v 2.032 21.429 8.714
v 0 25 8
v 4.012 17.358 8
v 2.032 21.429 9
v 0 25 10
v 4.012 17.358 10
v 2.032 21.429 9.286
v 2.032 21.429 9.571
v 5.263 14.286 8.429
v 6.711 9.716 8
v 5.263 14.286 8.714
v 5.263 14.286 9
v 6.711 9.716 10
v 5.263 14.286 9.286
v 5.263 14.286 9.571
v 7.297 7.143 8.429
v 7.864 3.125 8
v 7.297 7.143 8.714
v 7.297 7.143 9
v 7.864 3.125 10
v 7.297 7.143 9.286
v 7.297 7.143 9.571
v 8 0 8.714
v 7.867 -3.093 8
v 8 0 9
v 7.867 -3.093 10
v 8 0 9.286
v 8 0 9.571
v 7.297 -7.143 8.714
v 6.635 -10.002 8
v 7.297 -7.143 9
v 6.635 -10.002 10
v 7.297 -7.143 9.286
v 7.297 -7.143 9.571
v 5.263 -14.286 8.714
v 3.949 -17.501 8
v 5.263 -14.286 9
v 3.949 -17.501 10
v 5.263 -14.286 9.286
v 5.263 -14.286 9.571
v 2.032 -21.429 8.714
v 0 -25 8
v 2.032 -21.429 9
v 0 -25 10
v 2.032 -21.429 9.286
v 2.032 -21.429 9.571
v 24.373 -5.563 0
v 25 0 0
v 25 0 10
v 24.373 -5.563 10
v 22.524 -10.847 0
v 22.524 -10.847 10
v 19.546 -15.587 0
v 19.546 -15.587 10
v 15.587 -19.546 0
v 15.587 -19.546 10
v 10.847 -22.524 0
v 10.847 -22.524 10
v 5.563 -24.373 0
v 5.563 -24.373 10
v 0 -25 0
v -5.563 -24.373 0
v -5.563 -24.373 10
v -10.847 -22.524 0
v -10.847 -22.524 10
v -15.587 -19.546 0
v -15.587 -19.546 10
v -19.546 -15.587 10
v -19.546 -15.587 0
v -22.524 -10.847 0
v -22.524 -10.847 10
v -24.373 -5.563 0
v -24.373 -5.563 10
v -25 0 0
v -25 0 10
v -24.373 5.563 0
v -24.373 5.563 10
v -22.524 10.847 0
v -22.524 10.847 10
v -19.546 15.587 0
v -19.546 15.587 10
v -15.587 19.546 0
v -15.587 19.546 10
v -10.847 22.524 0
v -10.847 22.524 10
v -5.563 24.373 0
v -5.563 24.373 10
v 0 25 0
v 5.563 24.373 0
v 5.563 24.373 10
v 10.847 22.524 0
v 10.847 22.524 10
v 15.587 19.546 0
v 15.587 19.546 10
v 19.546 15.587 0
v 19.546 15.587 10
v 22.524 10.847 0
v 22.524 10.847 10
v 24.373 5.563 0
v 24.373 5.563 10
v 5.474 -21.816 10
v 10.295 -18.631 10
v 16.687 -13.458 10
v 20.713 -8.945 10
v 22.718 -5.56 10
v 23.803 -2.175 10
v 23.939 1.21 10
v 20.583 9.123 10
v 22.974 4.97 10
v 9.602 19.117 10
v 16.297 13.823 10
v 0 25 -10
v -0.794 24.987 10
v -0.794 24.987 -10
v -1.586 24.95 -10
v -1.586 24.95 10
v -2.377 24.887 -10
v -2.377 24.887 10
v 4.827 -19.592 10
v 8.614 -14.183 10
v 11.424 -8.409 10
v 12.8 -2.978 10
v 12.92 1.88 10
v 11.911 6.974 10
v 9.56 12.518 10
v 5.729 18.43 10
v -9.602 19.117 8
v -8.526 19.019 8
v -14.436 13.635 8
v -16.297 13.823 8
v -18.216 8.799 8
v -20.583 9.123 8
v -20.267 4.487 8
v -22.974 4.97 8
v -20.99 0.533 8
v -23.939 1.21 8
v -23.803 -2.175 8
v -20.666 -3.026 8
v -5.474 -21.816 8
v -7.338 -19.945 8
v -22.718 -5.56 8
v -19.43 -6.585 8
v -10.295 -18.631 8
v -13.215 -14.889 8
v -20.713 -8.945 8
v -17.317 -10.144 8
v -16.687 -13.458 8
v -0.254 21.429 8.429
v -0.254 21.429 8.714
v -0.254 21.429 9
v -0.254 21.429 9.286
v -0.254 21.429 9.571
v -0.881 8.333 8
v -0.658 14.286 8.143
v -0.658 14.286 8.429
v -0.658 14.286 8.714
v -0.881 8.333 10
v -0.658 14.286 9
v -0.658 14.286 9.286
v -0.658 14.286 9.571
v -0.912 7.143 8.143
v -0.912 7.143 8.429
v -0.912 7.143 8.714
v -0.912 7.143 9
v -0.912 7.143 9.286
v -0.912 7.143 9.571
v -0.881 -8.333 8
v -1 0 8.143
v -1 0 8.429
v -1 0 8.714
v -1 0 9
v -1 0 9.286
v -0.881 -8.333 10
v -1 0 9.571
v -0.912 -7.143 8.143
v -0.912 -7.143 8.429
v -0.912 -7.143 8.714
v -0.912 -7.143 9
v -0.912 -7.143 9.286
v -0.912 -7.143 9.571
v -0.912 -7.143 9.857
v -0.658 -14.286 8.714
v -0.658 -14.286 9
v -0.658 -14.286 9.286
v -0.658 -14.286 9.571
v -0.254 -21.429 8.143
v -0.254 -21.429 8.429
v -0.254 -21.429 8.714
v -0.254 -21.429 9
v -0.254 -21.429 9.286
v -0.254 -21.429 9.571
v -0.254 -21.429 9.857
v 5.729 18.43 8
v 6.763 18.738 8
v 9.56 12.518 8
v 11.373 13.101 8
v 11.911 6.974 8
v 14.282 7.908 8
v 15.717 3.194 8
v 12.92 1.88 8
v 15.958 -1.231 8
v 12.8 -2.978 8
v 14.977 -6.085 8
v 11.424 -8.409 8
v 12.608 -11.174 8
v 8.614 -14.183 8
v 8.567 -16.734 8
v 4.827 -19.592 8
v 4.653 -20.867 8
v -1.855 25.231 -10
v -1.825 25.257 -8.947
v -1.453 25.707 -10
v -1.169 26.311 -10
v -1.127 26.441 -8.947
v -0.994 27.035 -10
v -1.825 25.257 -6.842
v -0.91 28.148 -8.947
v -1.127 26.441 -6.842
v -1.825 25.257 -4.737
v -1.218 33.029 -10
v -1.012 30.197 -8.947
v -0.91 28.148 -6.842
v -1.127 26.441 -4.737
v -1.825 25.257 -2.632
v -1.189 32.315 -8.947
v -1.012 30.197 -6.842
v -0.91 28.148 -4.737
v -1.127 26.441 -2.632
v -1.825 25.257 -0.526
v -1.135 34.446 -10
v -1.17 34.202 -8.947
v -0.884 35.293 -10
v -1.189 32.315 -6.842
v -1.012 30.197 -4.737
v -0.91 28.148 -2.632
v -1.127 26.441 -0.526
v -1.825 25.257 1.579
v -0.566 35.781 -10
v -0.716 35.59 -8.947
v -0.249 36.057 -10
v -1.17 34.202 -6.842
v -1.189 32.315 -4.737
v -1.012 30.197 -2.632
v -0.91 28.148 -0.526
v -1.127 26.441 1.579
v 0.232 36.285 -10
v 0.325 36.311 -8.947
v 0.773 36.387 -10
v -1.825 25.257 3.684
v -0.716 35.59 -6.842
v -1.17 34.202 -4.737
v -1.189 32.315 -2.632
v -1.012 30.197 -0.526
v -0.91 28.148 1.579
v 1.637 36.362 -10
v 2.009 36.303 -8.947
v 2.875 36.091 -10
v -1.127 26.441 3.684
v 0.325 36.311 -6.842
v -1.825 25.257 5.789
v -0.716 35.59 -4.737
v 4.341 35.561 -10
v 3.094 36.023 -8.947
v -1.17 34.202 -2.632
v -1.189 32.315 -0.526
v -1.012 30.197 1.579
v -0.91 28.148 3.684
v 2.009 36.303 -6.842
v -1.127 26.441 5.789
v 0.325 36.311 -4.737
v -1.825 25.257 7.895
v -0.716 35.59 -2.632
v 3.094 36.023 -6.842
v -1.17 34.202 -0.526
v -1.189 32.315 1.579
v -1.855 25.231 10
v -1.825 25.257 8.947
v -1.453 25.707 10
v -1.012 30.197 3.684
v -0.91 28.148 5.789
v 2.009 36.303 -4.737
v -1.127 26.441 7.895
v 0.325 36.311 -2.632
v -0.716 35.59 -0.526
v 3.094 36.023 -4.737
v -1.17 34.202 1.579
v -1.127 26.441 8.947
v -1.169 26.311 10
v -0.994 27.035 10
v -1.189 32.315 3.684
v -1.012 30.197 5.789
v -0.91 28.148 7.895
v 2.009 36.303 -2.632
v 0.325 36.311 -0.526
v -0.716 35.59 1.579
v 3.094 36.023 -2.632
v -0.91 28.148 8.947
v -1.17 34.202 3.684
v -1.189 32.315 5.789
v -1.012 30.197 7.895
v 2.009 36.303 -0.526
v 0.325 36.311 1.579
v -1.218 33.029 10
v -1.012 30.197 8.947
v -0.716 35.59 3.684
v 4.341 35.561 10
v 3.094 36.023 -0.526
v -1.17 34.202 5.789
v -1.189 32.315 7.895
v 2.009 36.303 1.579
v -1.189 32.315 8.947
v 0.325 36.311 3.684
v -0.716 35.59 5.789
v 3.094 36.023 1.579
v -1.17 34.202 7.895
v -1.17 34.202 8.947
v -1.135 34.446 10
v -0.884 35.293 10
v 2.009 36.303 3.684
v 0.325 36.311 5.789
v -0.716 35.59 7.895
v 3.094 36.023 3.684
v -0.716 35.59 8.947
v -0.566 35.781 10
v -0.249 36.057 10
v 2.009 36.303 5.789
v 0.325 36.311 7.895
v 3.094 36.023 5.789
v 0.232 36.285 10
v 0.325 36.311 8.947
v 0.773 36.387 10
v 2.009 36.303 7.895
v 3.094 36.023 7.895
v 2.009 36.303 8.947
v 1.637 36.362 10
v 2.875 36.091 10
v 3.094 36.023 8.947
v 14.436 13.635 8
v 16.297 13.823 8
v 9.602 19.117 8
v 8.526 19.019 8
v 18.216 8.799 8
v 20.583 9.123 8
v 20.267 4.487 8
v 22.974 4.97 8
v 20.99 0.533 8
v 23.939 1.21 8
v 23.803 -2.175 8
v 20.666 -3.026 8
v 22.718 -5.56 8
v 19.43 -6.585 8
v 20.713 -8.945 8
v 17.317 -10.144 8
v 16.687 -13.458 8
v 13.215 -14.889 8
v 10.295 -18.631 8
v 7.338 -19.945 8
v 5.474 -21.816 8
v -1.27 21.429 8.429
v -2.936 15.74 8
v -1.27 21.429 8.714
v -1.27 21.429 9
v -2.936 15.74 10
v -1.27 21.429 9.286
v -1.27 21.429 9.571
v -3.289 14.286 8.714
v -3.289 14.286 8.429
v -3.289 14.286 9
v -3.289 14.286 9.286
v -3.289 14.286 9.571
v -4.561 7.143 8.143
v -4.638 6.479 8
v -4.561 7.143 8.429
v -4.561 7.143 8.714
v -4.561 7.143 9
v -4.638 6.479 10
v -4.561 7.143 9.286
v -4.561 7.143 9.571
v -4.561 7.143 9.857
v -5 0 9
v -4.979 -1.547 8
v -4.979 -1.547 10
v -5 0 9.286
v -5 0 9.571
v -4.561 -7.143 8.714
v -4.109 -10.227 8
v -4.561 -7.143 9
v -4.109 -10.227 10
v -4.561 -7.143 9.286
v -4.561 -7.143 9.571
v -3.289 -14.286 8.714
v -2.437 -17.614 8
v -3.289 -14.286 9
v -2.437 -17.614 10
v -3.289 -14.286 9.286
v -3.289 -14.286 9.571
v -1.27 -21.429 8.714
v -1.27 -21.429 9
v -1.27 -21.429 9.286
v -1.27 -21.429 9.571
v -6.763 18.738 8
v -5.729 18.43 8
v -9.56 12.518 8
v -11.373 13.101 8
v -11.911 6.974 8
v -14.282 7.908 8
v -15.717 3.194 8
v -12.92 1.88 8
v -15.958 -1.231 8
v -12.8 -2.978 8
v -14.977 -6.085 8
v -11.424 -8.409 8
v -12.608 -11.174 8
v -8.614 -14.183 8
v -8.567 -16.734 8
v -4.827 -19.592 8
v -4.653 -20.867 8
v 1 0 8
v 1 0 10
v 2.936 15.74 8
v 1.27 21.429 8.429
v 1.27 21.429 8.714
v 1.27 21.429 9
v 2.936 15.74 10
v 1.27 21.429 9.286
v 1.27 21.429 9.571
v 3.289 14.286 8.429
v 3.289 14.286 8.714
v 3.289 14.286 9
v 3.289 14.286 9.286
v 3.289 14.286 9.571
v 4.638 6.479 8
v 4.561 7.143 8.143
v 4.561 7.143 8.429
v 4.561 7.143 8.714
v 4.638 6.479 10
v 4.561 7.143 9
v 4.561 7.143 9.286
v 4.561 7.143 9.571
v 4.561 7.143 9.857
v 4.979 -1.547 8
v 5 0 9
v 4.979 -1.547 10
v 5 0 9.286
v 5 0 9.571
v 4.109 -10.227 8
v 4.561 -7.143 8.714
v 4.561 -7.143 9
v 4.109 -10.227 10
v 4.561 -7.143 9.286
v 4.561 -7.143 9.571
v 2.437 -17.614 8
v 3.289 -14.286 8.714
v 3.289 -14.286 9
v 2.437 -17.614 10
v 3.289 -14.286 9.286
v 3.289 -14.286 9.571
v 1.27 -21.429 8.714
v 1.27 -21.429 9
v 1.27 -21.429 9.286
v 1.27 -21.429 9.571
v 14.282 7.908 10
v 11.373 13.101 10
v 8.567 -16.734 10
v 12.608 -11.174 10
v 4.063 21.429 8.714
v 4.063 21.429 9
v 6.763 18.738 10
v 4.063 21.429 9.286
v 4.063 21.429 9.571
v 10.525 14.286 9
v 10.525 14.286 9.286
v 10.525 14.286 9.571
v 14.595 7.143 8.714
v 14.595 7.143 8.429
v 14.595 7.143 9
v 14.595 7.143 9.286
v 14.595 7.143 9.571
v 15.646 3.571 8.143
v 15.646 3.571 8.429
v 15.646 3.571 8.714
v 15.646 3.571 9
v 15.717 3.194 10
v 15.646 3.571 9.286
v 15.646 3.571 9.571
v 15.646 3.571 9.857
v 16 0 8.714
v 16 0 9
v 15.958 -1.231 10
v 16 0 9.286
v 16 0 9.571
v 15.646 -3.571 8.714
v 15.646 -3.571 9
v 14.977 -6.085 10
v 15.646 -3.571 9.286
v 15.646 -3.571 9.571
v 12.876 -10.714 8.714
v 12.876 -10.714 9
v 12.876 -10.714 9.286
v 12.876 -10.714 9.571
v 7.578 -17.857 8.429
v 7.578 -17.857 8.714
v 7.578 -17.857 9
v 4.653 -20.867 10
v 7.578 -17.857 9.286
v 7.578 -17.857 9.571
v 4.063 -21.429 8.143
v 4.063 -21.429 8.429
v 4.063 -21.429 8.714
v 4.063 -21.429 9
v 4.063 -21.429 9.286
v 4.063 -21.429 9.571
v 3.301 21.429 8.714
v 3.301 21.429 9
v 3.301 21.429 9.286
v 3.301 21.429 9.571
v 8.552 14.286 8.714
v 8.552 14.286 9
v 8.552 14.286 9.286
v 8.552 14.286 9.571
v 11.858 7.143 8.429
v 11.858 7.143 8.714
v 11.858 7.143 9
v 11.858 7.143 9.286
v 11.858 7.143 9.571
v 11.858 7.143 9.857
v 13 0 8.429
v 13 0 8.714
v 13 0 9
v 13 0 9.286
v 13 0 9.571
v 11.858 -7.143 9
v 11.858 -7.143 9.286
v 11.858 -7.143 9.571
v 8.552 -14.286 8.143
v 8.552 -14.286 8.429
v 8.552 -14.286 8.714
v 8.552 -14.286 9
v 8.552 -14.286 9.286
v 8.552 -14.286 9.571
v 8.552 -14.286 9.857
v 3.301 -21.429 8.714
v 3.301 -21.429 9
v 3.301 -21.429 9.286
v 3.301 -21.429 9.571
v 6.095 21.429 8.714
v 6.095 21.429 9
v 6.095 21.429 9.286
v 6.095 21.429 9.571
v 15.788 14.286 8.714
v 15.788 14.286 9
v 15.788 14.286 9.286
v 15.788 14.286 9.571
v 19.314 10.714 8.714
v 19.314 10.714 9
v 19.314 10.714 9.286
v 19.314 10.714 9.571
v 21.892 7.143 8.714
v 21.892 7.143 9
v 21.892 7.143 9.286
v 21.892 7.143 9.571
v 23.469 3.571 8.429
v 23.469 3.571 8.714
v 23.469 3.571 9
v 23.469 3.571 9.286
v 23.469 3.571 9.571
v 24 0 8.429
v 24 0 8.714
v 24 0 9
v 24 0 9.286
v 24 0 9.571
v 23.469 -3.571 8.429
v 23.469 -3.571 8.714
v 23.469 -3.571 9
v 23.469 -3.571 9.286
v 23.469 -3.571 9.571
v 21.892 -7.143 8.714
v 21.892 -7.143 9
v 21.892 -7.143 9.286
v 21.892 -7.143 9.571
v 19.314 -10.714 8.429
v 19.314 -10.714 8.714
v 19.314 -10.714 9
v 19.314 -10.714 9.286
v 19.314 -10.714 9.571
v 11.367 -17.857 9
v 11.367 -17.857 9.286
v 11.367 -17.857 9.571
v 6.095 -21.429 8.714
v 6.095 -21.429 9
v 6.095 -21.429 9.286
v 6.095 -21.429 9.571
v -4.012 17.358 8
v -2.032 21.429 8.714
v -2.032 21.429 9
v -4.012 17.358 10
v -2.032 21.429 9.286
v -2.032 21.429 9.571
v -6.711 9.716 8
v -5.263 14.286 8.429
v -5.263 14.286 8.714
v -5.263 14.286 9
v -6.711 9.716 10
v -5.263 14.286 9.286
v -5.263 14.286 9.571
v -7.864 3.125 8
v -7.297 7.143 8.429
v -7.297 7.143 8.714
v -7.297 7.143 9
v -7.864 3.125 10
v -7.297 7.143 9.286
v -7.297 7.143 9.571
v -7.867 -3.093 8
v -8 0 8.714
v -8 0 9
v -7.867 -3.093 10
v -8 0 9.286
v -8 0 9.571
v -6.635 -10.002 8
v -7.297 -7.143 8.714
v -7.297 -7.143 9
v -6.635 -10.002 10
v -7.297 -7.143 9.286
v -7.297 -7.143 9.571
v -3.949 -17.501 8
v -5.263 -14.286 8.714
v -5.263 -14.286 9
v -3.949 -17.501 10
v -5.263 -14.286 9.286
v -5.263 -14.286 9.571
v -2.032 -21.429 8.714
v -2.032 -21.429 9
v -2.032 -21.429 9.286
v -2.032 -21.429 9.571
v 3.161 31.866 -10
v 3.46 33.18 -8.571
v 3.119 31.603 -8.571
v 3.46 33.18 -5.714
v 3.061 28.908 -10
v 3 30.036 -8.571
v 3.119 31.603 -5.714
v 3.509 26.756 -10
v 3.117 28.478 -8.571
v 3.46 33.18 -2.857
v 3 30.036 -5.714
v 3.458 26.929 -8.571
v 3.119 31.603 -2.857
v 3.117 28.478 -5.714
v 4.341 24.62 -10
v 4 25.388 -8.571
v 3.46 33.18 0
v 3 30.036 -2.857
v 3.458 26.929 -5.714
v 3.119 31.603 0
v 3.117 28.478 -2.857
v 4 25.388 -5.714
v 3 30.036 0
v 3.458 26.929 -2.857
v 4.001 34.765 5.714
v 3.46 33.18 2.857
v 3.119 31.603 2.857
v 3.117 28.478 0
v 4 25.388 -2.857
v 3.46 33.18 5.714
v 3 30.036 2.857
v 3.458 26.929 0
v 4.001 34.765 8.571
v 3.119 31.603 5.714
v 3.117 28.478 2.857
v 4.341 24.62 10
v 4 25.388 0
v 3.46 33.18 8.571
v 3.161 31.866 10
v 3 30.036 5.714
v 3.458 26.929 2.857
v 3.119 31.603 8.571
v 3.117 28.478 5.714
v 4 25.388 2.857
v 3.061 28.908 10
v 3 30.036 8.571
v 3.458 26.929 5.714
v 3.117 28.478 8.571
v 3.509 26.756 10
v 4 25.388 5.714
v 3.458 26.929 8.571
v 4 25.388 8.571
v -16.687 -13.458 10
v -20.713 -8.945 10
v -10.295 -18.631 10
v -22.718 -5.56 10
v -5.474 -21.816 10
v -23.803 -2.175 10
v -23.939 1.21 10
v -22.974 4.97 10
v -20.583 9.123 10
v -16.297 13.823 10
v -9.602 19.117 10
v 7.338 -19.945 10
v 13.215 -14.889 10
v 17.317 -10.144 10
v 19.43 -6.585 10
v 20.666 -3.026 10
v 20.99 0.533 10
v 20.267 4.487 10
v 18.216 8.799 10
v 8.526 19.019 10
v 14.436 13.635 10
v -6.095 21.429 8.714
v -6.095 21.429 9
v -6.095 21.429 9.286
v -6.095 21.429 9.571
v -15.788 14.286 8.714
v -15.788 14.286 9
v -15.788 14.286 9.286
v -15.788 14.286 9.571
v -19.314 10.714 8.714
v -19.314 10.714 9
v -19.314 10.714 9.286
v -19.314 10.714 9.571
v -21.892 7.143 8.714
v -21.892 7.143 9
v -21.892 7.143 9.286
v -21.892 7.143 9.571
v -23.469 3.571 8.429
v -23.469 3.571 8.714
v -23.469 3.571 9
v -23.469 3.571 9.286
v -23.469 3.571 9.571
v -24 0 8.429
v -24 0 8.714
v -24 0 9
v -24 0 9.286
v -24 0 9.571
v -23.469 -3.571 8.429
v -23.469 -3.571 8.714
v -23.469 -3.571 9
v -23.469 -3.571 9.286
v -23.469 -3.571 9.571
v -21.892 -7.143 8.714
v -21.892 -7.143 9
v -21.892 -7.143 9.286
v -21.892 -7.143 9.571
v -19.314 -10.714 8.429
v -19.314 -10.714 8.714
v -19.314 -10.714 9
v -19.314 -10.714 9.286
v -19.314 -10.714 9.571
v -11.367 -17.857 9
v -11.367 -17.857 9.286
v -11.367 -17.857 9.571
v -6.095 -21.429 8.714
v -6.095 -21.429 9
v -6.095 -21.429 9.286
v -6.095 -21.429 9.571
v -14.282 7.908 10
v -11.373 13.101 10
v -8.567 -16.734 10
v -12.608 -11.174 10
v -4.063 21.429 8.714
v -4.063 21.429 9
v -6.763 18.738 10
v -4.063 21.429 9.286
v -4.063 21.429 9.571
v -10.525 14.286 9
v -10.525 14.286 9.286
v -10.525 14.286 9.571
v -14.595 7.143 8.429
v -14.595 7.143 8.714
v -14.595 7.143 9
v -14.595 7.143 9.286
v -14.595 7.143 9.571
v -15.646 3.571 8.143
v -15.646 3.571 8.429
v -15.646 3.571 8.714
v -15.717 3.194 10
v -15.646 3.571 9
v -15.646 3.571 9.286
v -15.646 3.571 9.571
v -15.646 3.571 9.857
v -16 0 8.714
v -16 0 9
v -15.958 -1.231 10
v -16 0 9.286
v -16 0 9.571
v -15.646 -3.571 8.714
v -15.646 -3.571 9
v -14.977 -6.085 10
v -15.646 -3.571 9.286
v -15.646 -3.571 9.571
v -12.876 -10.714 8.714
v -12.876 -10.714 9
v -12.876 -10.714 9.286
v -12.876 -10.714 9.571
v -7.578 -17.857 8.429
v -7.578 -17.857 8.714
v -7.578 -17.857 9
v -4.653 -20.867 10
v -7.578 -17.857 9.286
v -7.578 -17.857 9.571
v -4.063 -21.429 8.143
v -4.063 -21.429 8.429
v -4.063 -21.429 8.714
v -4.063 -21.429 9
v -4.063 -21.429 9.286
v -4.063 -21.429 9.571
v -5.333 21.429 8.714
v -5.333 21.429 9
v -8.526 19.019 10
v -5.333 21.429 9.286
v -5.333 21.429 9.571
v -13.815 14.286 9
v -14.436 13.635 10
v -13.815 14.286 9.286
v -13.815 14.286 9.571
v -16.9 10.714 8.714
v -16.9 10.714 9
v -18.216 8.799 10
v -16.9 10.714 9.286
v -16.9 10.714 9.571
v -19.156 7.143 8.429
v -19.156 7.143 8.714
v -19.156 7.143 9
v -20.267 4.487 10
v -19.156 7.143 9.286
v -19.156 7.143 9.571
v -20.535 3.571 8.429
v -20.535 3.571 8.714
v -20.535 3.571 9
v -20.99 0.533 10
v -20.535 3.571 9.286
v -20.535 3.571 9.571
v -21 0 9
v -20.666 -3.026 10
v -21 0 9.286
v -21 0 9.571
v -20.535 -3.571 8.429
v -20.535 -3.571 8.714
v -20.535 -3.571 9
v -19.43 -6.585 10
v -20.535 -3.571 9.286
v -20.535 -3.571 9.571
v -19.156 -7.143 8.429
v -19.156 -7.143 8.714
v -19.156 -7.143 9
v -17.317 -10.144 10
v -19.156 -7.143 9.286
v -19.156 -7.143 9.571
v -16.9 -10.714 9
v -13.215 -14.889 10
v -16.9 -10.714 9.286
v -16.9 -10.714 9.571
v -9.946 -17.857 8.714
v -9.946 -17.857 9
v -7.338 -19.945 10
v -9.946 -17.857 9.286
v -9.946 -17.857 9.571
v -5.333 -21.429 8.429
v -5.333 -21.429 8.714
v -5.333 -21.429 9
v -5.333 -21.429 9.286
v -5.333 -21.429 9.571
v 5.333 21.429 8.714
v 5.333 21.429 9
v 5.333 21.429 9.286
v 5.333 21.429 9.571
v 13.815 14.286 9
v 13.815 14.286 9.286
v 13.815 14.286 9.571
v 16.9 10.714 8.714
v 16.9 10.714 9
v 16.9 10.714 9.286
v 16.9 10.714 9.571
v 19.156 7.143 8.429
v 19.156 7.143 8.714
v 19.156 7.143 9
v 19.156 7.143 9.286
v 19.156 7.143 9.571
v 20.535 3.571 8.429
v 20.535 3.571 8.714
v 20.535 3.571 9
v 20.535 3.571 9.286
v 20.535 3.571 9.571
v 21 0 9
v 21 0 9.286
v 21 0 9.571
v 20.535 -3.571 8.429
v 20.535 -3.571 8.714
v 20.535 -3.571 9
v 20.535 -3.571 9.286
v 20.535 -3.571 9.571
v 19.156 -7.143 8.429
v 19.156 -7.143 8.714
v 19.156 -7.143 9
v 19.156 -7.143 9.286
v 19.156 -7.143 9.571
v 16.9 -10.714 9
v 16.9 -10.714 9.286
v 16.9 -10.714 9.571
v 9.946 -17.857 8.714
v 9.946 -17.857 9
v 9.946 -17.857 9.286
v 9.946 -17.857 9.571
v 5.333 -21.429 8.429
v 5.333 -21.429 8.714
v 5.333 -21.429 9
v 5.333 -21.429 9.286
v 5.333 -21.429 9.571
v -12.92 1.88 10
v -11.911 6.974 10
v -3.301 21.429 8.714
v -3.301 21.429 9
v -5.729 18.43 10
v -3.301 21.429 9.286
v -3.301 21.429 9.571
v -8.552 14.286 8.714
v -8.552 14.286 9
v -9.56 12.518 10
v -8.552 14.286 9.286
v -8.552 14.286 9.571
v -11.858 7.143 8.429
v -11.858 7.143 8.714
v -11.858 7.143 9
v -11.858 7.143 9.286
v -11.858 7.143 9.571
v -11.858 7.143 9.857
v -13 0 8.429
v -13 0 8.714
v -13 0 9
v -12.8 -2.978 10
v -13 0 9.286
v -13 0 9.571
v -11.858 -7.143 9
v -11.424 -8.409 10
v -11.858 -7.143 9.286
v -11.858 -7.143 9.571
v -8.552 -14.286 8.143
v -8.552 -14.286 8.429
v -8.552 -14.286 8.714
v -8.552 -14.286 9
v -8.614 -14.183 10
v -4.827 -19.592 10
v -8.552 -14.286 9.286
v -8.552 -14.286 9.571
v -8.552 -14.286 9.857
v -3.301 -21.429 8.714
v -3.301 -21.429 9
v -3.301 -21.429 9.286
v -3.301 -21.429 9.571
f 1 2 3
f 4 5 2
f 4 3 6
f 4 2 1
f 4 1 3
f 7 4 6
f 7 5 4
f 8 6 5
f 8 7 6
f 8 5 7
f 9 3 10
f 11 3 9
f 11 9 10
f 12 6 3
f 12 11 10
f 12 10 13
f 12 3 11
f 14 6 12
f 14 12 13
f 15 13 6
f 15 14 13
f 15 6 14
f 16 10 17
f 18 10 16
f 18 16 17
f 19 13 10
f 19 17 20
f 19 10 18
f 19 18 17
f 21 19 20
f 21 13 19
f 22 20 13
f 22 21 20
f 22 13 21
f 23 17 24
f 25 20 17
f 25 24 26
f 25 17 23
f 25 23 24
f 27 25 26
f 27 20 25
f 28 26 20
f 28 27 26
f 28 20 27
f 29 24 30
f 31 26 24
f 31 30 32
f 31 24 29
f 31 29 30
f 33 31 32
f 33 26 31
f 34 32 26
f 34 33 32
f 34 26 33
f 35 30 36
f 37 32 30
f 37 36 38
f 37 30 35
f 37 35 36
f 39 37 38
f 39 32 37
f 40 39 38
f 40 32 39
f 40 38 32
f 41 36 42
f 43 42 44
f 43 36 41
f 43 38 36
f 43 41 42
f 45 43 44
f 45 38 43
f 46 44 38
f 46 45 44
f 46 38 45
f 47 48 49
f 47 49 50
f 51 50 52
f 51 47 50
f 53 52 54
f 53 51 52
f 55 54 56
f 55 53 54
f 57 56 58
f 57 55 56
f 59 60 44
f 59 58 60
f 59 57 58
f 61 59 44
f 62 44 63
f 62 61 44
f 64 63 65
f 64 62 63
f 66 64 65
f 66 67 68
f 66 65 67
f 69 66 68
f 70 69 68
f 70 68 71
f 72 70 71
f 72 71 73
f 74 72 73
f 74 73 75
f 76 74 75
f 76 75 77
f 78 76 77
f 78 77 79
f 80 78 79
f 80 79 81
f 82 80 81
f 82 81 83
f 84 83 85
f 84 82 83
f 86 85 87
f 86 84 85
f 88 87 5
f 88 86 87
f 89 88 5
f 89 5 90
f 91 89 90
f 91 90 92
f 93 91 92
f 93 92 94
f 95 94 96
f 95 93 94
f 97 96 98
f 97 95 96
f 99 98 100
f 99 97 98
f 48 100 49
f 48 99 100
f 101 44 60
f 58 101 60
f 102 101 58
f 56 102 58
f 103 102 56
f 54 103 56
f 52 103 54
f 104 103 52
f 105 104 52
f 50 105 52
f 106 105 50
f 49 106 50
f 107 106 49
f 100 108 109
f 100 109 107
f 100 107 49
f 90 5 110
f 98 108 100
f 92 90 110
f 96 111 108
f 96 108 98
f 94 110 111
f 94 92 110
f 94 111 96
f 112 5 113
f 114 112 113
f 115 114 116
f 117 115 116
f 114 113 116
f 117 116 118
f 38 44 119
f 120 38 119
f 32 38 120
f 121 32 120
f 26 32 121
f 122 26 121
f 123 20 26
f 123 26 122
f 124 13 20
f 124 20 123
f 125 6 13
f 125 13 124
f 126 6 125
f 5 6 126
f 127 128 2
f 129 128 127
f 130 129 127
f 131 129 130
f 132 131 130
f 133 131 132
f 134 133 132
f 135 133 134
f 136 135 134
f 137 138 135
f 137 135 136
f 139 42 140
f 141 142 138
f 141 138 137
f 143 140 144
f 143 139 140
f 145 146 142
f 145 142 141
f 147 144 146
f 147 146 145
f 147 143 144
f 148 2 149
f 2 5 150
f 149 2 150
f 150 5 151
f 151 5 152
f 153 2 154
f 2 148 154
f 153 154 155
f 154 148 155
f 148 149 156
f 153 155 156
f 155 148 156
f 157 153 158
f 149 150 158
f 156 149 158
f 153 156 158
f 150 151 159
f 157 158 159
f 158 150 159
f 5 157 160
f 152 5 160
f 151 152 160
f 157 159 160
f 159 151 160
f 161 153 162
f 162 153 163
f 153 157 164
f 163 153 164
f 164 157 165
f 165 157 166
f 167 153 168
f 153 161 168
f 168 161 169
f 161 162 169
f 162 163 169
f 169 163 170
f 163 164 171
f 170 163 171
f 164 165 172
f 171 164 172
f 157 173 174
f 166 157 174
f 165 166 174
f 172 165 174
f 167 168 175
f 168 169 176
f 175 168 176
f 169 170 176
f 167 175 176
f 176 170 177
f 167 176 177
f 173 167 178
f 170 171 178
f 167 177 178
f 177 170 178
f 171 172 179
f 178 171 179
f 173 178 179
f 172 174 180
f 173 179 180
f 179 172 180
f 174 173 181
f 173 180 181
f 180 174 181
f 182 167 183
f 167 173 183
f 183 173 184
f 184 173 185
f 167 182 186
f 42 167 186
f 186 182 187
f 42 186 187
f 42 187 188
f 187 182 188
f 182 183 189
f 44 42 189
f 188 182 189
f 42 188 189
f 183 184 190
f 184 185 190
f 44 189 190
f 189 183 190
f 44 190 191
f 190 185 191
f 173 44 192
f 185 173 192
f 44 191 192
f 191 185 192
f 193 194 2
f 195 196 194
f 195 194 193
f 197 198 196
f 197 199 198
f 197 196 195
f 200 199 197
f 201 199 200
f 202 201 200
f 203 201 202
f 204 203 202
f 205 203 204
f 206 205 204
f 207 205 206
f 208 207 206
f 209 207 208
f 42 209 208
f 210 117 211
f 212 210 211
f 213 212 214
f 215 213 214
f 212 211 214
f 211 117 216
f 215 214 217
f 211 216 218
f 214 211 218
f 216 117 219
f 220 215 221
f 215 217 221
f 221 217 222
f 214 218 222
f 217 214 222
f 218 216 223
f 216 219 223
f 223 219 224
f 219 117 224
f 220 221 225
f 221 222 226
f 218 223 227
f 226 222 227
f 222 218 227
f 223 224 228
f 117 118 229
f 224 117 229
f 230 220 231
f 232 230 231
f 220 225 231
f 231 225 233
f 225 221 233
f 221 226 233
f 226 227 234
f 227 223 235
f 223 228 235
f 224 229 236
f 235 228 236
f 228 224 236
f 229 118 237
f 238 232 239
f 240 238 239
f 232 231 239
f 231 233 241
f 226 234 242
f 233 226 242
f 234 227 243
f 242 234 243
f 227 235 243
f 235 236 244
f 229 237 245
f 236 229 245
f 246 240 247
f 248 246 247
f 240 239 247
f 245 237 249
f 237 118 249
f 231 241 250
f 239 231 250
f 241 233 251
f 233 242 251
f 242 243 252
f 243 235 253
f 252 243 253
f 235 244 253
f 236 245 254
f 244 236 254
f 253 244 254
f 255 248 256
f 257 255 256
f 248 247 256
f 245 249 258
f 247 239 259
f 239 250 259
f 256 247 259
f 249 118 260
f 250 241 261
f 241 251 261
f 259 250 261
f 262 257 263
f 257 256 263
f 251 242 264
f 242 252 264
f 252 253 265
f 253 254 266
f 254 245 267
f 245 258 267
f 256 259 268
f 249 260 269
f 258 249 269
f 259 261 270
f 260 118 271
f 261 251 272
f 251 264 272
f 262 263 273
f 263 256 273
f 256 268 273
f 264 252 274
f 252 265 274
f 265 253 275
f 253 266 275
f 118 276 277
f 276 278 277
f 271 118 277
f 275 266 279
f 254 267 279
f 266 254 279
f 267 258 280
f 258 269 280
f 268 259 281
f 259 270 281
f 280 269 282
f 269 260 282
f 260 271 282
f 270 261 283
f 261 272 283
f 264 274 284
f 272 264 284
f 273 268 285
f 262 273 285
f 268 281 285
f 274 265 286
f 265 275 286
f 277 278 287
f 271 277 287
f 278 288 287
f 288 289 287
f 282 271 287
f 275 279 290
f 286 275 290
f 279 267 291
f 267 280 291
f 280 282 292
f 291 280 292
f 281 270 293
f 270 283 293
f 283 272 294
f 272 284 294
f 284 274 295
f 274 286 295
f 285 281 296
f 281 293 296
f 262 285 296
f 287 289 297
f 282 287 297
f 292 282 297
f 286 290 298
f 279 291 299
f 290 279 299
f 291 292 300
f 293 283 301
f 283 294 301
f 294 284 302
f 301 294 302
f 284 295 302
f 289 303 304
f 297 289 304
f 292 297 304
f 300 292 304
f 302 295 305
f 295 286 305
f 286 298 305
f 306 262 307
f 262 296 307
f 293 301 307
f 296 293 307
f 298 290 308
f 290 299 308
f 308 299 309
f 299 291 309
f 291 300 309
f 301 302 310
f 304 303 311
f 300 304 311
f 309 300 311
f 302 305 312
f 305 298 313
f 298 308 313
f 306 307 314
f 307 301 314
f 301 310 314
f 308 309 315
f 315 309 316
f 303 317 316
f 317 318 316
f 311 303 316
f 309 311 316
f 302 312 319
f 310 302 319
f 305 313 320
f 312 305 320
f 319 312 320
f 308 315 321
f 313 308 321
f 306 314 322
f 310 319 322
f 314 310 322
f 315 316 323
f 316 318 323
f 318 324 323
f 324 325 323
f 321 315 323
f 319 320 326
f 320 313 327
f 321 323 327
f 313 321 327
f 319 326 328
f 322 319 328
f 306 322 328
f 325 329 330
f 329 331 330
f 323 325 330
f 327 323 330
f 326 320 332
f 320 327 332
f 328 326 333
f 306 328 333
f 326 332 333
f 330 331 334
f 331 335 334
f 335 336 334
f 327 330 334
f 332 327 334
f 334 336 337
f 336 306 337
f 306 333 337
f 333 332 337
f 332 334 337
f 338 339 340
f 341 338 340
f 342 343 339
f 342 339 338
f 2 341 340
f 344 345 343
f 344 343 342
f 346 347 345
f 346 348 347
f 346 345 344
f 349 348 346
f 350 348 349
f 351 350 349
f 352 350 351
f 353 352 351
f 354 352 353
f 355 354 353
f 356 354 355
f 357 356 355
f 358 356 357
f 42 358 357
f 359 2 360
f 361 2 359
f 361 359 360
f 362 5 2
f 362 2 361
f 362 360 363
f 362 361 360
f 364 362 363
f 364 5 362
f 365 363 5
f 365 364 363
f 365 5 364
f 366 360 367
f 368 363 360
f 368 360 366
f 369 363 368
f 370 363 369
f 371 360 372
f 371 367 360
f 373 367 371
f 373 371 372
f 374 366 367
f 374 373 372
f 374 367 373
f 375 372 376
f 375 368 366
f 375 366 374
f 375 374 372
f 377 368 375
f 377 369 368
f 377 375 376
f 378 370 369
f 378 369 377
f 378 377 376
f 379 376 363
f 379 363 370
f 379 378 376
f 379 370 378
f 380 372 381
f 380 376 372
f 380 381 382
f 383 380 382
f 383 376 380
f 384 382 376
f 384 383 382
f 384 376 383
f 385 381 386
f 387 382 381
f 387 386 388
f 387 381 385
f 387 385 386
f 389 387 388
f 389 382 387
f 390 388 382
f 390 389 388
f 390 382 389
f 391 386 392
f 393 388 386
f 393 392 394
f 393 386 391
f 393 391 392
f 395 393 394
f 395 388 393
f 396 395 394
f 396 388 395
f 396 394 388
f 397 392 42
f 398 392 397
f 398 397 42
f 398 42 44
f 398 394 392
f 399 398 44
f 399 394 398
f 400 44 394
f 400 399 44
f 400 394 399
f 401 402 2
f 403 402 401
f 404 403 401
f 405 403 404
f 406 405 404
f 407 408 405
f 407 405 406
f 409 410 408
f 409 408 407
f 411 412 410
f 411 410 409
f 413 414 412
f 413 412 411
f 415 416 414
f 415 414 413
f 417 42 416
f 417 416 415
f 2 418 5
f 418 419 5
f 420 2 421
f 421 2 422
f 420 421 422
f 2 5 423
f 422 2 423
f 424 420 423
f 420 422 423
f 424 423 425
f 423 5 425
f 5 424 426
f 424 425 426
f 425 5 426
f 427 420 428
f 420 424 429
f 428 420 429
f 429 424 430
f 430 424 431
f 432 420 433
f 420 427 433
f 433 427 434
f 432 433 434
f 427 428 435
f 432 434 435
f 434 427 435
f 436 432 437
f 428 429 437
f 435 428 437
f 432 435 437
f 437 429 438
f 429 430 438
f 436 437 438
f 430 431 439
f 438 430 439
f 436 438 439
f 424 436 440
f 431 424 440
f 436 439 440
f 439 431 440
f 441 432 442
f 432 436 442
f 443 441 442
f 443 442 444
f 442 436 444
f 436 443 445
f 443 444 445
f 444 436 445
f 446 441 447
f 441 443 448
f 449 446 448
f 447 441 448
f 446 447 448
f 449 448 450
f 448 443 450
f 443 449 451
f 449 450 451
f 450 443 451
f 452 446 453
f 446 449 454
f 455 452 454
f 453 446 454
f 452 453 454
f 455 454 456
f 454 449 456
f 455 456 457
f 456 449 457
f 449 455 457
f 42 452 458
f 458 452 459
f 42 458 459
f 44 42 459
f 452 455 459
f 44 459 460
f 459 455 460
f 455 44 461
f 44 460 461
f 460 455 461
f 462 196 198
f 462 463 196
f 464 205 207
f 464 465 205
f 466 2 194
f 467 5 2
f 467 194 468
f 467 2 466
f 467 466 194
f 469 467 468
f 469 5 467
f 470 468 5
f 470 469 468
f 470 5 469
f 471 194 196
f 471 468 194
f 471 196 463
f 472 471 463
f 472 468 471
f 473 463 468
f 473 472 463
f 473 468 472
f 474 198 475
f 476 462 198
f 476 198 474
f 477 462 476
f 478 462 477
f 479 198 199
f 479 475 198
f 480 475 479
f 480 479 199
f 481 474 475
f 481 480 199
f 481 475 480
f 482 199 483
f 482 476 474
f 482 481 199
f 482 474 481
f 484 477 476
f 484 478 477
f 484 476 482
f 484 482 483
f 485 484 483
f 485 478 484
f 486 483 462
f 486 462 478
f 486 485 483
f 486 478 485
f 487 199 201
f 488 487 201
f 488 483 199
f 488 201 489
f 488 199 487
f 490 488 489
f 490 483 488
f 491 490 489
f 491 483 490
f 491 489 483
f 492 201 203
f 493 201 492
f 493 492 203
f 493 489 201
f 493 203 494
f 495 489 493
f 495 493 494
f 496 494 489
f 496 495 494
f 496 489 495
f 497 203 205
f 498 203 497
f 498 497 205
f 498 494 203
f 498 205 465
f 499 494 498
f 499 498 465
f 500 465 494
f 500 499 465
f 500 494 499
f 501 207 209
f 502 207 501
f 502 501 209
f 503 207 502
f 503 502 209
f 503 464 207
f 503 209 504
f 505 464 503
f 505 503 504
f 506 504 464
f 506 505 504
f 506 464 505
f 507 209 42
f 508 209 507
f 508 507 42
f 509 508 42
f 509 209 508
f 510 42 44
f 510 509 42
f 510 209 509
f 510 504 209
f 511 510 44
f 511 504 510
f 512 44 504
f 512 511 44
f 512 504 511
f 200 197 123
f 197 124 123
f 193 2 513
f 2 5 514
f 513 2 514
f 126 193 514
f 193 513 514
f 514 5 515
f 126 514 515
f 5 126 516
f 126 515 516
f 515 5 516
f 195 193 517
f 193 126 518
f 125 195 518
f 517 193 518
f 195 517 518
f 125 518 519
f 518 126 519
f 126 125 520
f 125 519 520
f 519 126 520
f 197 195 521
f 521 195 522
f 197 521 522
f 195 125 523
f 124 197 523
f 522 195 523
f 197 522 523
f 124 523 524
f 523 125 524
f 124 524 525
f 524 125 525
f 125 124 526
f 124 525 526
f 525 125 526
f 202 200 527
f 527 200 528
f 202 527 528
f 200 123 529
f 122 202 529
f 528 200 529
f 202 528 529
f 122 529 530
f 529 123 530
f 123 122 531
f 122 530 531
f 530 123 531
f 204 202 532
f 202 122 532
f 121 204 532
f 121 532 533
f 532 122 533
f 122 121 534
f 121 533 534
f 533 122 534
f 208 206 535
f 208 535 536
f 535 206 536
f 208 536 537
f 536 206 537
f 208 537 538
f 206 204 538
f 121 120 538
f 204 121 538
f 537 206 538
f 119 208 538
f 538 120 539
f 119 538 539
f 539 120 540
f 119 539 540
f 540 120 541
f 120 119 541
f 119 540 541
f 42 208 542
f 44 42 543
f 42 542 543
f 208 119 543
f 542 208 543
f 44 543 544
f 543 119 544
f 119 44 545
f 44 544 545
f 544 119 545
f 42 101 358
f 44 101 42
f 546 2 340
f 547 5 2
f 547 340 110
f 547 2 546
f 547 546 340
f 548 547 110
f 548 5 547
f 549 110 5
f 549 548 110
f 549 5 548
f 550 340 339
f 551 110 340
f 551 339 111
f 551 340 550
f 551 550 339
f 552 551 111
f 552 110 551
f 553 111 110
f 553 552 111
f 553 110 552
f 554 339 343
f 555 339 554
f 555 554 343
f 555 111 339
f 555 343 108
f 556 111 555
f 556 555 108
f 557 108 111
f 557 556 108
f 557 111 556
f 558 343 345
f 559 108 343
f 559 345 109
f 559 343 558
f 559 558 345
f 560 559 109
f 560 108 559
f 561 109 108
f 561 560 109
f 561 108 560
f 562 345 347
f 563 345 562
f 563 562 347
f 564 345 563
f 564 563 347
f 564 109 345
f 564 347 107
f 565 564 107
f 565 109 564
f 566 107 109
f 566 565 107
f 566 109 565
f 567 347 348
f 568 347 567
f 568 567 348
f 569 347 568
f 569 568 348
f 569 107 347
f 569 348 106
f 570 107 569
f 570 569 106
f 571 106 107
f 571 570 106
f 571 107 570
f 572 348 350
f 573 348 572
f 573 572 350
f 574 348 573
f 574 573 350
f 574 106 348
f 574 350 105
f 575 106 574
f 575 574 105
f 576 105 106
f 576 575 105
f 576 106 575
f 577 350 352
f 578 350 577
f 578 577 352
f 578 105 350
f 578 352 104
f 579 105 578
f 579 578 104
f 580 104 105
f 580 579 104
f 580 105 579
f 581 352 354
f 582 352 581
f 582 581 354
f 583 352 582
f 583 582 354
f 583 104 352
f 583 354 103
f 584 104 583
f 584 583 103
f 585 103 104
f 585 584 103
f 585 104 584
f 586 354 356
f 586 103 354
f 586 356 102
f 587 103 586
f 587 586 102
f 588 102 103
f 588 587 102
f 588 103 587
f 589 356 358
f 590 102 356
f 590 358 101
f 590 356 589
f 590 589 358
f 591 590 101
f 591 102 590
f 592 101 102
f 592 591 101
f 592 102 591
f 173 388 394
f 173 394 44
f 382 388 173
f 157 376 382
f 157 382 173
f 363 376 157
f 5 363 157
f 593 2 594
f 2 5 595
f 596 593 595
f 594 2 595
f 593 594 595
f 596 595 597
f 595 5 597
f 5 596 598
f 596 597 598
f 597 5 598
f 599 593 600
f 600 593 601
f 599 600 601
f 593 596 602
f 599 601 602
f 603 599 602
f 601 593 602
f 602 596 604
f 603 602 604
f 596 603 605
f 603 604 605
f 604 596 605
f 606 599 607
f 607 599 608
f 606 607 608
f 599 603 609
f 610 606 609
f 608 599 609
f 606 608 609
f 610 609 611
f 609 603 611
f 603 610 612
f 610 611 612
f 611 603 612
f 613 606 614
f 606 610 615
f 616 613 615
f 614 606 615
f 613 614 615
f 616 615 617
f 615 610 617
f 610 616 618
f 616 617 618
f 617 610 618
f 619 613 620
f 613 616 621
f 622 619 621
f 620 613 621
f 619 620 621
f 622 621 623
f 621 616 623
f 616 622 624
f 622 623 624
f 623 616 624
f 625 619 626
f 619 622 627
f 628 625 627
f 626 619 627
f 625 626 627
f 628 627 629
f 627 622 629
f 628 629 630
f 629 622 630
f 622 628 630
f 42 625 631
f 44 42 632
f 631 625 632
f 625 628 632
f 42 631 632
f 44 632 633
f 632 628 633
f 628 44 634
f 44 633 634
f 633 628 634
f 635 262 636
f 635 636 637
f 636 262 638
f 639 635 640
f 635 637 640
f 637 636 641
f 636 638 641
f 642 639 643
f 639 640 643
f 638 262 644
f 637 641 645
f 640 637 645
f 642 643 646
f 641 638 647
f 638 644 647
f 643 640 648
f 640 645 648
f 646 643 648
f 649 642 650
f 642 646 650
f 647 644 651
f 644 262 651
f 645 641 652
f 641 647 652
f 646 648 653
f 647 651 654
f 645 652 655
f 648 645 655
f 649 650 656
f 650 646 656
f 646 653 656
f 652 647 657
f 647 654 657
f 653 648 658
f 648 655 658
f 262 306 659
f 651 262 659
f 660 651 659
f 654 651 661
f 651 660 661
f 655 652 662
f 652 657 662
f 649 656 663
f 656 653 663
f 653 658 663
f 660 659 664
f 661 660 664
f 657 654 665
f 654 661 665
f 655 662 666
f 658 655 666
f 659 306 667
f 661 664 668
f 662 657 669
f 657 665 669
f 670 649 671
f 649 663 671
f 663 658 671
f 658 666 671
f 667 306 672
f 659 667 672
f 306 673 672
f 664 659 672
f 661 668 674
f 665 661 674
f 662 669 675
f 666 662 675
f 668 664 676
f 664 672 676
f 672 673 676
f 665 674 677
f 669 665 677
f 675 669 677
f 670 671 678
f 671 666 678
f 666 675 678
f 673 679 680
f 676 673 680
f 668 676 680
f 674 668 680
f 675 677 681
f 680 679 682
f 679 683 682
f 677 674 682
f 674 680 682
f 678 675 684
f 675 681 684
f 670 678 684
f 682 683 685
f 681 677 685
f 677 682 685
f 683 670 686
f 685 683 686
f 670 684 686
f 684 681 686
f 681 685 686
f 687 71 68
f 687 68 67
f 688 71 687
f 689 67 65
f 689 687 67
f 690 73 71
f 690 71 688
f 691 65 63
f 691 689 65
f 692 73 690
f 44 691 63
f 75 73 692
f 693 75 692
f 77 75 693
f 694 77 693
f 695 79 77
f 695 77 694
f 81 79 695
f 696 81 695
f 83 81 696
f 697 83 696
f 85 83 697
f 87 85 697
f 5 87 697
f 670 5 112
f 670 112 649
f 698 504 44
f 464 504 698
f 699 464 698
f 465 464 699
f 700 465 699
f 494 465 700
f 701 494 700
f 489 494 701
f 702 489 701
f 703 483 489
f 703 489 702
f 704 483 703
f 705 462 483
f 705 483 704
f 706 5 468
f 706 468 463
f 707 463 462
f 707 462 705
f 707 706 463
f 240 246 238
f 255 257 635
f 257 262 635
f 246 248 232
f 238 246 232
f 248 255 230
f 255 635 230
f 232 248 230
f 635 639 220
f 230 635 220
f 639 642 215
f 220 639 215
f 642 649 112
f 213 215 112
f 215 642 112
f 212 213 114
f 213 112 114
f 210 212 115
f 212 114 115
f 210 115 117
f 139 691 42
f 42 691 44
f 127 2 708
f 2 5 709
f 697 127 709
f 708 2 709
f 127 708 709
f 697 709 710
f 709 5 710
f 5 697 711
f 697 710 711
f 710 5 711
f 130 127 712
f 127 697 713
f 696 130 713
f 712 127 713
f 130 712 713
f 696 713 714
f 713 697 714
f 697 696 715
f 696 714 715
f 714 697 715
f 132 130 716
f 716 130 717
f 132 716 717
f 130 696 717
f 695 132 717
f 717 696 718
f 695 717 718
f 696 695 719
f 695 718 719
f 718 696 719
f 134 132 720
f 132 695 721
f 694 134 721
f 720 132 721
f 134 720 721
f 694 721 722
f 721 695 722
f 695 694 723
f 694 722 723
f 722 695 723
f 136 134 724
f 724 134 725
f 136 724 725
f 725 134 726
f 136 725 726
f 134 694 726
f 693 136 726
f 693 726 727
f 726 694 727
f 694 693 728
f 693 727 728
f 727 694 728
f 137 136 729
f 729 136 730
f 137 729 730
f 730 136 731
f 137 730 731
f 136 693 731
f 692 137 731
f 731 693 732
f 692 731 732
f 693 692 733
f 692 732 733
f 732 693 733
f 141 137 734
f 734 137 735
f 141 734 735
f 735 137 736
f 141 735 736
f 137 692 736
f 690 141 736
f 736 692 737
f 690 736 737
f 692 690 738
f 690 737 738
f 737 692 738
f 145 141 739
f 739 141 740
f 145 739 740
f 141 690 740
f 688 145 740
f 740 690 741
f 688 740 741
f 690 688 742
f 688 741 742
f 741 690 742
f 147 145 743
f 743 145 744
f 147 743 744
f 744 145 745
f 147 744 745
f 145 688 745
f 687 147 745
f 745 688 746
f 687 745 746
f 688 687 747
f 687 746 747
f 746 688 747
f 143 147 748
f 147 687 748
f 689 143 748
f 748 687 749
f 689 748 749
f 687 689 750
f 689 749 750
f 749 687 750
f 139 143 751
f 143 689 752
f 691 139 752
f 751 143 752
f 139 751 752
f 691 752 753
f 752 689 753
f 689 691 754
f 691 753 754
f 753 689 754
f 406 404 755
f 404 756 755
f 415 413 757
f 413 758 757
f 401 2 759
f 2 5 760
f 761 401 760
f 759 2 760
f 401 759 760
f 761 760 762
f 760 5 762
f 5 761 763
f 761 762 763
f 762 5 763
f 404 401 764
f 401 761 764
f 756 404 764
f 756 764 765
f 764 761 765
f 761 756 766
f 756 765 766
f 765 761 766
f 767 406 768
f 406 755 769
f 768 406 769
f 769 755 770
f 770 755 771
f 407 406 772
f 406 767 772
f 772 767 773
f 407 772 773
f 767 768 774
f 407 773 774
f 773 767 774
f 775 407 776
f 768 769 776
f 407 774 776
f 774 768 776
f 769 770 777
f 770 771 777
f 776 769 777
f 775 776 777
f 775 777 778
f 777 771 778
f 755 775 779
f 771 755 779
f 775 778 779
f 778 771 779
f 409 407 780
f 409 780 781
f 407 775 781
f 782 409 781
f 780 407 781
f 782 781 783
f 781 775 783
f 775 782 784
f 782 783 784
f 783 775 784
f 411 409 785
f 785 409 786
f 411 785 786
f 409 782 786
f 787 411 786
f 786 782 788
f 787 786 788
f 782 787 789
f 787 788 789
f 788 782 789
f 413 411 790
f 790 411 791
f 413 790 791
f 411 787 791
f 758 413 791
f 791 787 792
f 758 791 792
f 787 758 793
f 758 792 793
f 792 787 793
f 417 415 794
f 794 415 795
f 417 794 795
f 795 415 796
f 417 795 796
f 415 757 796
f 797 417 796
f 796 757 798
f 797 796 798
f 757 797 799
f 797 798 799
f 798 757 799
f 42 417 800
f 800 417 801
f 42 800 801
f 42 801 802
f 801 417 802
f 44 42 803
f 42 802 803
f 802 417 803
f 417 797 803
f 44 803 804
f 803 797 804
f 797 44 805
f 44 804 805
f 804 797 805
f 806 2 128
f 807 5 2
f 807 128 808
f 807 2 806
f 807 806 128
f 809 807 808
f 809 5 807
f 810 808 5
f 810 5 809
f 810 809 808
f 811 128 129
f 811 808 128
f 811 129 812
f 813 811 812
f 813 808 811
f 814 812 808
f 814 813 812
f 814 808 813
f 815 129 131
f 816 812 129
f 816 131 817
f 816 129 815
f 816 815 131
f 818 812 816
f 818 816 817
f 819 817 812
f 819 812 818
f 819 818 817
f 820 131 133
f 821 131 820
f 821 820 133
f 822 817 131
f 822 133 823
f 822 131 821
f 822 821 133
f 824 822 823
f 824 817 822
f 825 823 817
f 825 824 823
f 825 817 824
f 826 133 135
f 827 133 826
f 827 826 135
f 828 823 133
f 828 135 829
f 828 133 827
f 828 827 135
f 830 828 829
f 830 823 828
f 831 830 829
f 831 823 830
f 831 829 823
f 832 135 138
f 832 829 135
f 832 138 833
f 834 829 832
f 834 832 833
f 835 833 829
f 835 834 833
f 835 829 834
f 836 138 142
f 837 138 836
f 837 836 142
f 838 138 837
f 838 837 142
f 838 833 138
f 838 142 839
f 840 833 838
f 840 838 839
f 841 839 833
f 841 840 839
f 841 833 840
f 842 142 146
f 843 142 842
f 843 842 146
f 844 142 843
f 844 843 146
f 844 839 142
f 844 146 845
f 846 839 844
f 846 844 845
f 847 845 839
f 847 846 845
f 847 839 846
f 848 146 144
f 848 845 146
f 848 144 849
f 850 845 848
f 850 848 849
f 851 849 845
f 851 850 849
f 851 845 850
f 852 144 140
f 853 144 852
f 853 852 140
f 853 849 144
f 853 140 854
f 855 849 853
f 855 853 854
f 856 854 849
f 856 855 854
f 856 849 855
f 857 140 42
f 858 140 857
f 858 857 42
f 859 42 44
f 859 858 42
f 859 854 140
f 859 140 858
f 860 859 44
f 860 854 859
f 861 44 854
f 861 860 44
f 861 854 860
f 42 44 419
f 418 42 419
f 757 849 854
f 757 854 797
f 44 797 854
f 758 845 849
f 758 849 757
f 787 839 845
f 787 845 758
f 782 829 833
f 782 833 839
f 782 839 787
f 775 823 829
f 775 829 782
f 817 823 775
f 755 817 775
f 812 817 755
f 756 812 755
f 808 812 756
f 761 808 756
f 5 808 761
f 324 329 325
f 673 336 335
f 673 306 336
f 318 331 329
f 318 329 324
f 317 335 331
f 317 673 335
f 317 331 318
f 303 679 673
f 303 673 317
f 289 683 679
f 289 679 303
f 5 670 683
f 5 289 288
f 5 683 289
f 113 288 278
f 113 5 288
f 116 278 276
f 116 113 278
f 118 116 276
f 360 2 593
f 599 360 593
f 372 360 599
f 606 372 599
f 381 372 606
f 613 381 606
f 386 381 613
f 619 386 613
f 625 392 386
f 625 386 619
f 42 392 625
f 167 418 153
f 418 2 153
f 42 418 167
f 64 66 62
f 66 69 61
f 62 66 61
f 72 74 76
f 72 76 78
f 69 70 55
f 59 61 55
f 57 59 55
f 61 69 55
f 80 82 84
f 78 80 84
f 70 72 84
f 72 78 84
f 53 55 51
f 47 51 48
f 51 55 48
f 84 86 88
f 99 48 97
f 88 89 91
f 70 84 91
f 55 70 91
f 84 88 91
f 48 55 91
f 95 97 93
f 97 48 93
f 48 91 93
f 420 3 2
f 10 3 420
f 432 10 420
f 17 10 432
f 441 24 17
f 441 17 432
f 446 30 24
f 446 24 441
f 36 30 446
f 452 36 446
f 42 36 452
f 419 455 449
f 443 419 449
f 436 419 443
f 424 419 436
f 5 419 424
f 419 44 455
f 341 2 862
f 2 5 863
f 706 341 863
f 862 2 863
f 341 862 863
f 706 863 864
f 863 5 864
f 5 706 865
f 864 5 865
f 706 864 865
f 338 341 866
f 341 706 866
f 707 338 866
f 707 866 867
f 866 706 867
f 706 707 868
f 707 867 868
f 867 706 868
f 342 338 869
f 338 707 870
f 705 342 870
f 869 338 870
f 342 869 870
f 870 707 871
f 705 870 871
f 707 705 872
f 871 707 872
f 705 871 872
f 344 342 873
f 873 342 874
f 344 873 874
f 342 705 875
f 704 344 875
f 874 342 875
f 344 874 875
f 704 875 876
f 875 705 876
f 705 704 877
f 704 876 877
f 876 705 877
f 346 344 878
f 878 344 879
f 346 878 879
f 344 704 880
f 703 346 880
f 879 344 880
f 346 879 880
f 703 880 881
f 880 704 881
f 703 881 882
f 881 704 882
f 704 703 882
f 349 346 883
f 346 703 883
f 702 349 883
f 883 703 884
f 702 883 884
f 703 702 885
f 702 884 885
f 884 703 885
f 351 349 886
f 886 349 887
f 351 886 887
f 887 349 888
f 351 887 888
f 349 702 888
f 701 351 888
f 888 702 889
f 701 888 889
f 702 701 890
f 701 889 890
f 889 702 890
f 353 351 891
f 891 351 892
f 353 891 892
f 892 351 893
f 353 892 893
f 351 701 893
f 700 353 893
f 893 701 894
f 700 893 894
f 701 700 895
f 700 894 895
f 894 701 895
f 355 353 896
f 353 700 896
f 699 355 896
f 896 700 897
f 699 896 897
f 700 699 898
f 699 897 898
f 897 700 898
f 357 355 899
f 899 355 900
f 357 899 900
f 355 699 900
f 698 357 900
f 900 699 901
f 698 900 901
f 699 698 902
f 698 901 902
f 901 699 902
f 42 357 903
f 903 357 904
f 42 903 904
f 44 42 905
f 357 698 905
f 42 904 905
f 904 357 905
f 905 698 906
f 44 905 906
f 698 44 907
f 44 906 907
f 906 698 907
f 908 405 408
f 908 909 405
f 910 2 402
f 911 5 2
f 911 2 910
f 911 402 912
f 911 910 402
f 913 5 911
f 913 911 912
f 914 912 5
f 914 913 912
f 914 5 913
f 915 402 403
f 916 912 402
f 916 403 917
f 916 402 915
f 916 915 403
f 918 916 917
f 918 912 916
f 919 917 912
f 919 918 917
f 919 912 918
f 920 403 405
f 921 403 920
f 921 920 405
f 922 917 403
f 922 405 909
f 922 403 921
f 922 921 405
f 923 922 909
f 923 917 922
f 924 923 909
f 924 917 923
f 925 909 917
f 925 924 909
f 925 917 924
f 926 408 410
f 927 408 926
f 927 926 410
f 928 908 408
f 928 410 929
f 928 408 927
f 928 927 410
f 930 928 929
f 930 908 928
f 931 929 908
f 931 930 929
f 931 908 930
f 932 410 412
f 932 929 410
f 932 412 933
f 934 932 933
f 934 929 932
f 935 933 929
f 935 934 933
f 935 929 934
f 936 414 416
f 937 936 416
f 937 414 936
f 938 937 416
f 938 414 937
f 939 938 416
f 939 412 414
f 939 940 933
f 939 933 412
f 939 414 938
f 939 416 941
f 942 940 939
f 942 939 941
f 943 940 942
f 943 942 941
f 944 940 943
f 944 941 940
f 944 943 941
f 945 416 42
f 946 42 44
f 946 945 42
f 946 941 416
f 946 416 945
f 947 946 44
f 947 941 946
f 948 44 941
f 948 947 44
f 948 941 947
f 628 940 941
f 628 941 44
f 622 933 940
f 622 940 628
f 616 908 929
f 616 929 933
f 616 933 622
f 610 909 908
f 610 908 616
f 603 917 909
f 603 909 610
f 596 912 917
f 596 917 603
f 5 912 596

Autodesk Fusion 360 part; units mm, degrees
sketch "Sketch1" plane through (0, 0, 0) normal (0, 0, 1) x (1, 0, 0)
  circle A0 centre (0, 0) radius 25
extrude "Extrude1" add sketch "Sketch1" along normal blind 10 makes body 1
sketch "Sketch2" plane through (0, 0, 10) normal (0, 0, 1) x (-1, 0, 0)
  circle A0 centre (0, 0) radius 25
  spline S0 degree 5 poles (0, -25) (-0.3792, -24) (-1.1046, -22) (-2.0933, -19) (-3.2095, -15) (-4.2453, -10) (-4.8894, -5) (-5.11, 0) (-4.8894, 5) (-4.2453, 10) (-3.2095, 15) (-2.0933, 19) (-1.1046, 22) (-0.3792, 24) (0, 25) knots 0 0 0 0 0 0 0.1 0.2 0.3 0.4 0.5 0.6 0.7 0.8 0.9 1 1 1 1 1 1
  spline S1 degree 5 poles (0, -25) (0.3792, -24) (1.1046, -22) (2.0933, -19) (3.2095, -15) (4.2453, -10) (4.8894, -5) (5.11, 0) (4.8894, 5) (4.2453, 10) (3.2095, 15) (2.0933, 19) (1.1046, 22) (0.3792, 24) (0, 25) knots 0 0 0 0 0 0 0.1 0.2 0.3 0.4 0.5 0.6 0.7 0.8 0.9 1 1 1 1 1 1
  spline S2 degree 5 poles (0, -25) (-0.6068, -24) (-1.7674, -22) (-3.3492, -19) (-5.1352, -15) (-6.7925, -10) (-7.8231, -5) (-8.176, 0) (-7.8231, 5) (-6.7925, 10) (-5.1352, 15) (-3.3492, 19) (-1.7674, 22) (-0.6068, 24) (0, 25) knots 0 0 0 0 0 0 0.1 0.2 0.3 0.4 0.5 0.6 0.7 0.8 0.9 1 1 1 1 1 1
  spline S3 degree 5 poles (0, -25) (0.6068, -24) (1.7674, -22) (3.3492, -19) (5.1352, -15) (6.7925, -10) (7.8231, -5) (8.176, 0) (7.8231, 5) (6.7925, 10) (5.1352, 15) (3.3492, 19) (1.7674, 22) (0.6068, 24) (0, 25) knots 0 0 0 0 0 0 0.1 0.2 0.3 0.4 0.5 0.6 0.7 0.8 0.9 1 1 1 1 1 1
  spline S4 degree 5 poles (0, -25) (-0.986, -24) (-2.8719, -22) (-5.4425, -19) (-8.3448, -15) (-11.0378, -10) (-12.7126, -5) (-13.2859, 0) (-12.7126, 5) (-11.0378, 10) (-8.3448, 15) (-5.4425, 19) (-2.8719, 22) (-0.986, 24) (0, 25) knots 0 0 0 0 0 0 0.1 0.2 0.3 0.4 0.5 0.6 0.7 0.8 0.9 1 1 1 1 1 1
  spline S5 degree 5 poles (0, -25) (-1.2136, -24) (-3.5347, -22) (-6.6985, -19) (-10.2705, -15) (-13.585, -10) (-15.6462, -5) (-16.3519, 0) (-15.6462, 5) (-13.585, 10) (-10.2705, 15) (-6.6985, 19) (-3.5347, 22) (-1.2136, 24) (0, 25) knots 0 0 0 0 0 0 0.1 0.2 0.3 0.4 0.5 0.6 0.7 0.8 0.9 1 1 1 1 1 1
  spline S6 degree 5 poles (0, -25) (-1.5928, -24) (-4.6393, -22) (-8.7918, -19) (-13.48, -15) (-17.8303, -10) (-20.5357, -5) (-21.4619, 0) (-20.5357, 5) (-17.8303, 10) (-13.48, 15) (-8.7918, 19) (-4.6393, 22) (-1.5928, 24) (0, 25) knots 0 0 0 0 0 0 0.1 0.2 0.3 0.4 0.5 0.6 0.7 0.8 0.9 1 1 1 1 1 1
  spline S7 degree 5 poles (0, -25) (-1.8203, -24) (-5.3021, -22) (-10.0477, -19) (-15.4057, -15) (-20.3775, -10) (-23.4693, -5) (-24.5279, 0) (-23.4693, 5) (-20.3775, 10) (-15.4057, 15) (-10.0477, 19) (-5.3021, 22) (-1.8203, 24) (0, 25) knots 0 0 0 0 0 0 0.1 0.2 0.3 0.4 0.5 0.6 0.7 0.8 0.9 1 1 1 1 1 1
  spline S8 degree 5 poles (0, -25) (0.986, -24) (2.8719, -22) (5.4425, -19) (8.3448, -15) (11.0378, -10) (12.7126, -5) (13.2859, 0) (12.7126, 5) (11.0378, 10) (8.3448, 15) (5.4425, 19) (2.8719, 22) (0.986, 24) (0, 25) knots 0 0 0 0 0 0 0.1 0.2 0.3 0.4 0.5 0.6 0.7 0.8 0.9 1 1 1 1 1 1
  spline S9 degree 5 poles (0, -25) (1.2136, -24) (3.5347, -22) (6.6985, -19) (10.2705, -15) (13.585, -10) (15.6462, -5) (16.3519, 0) (15.6462, 5) (13.585, 10) (10.2705, 15) (6.6985, 19) (3.5347, 22) (1.2136, 24) (0, 25) knots 0 0 0 0 0 0 0.1 0.2 0.3 0.4 0.5 0.6 0.7 0.8 0.9 1 1 1 1 1 1
  spline S10 degree 5 poles (0, -25) (1.5928, -24) (4.6393, -22) (8.7918, -19) (13.48, -15) (17.8303, -10) (20.5357, -5) (21.4619, 0) (20.5357, 5) (17.8303, 10) (13.48, 15) (8.7918, 19) (4.6393, 22) (1.5928, 24) (0, 25) knots 0 0 0 0 0 0 0.1 0.2 0.3 0.4 0.5 0.6 0.7 0.8 0.9 1 1 1 1 1 1
  spline S11 degree 5 poles (0, -25) (1.8203, -24) (5.3021, -22) (10.0477, -19) (15.4057, -15) (20.3775, -10) (23.4693, -5) (24.5279, 0) (23.4693, 5) (20.3775, 10) (15.4057, 15) (10.0477, 19) (5.3021, 22) (1.8203, 24) (0, 25) knots 0 0 0 0 0 0 0.1 0.2 0.3 0.4 0.5 0.6 0.7 0.8 0.9 1 1 1 1 1 1
  line L0 (0, 25) -> (-1, 0)
  line L1 (-1, 0) -> (0, -25)
  spline S12 degree 5 poles (0, -25) (0.0758, -24) (0.2209, -22) (0.4187, -19) (0.6419, -15) (0.8491, -10) (0.9779, -5) (1.022, 0) (0.9779, 5) (0.8491, 10) (0.6419, 15) (0.4187, 19) (0.2209, 22) (0.0758, 24) (0, 25) knots 0 0 0 0 0 0 0.1 0.2 0.3 0.4 0.5 0.6 0.7 0.8 0.9 1 1 1 1 1 1
  point P0 (-5, 0)
  point P1 (5, 0)
  point P2 (-8, 0)
  point P3 (8, 0)
  point P4 (-13, 0)
  point P5 (-16, 0)
  point P6 (-21, 0)
  point P7 (-24, 0)
  point P8 (13, 0)
  point P9 (16, 0)
  point P10 (21, 0)
  point P11 (24, 0)
  point P12 (1, 0)
extrude "Extrude2" cut sketch "Sketch2" against normal blind 2 contours S1 S3 | S0 S2 | S4 S5 | S6 S7 | S8 S9 | S10 S11 | L0 L1 S12 bodies 1
sketch "Sketch3" plane through (0, 0, 10) normal (0, 0, 1) x (-1, 0, 0)
  spline S0 degree 5 poles (0, 25) (1.8203, 24) (5.3021, 22) (10.0477, 19) (15.4057, 15) (20.3775, 10) (23.4693, 5) (24.5279, 0) (23.4693, -5) (20.3775, -10) (15.4057, -15) (10.0477, -19) (5.3021, -22) (1.8203, -24) (0, -25) knots -1 -1 -1 -1 -1 -1 -0.9 -0.8 -0.7 -0.6 -0.5 -0.4 -0.3 -0.2 -0.1 0 0 0 0 0 0
  arc A0 (0, -25) -> (0, 25) centre (0, 0) ccw
  line L0 (0, 0) -> (25, 0) construction
  line L1 (0, 0) -> (-25, 0) construction
  spline S1 degree 5 poles (4.3412, -24.6202) (4.0652, -24.5975) (3.5414, -24.583) (2.8403, -24.6537) (2.076, -24.9343) (1.4065, -25.597) (1.0139, -26.5616) (0.8704, -27.797) (0.9159, -29.2361) (1.0635, -30.7818) (1.2128, -32.3223) (1.2603, -33.7424) (1.1111, -34.9361) (0.6892, -35.8191) (-0.048, -36.3442) (-1.1179, -36.4921) (-2.2421, -36.3066) (-3.2341, -35.9988) (-3.9612, -35.7192) (-4.3412, -35.5608) knots 0 0 0 0 0 0 0.066667 0.133333 0.2 0.266667 0.333333 0.4 0.466667 0.533333 0.6 0.666667 0.733333 0.8 0.866667 0.933333 1 1 1 1 1 1
  spline S2 degree 5 poles (-4.3412, -35.5608) (-4.2397, -35.3378) (-4.0455, -34.8923) (-3.7808, -34.225) (-3.4816, -33.3376) (-3.2037, -32.2321) (-3.0304, -31.131) (-2.9705, -30.0345) (-3.0288, -28.9428) (-3.2011, -27.8558) (-3.4789, -26.7731) (-3.7786, -25.9101) (-4.0443, -25.2645) (-4.2393, -24.8348) (-4.3412, -24.6202) knots 0 0 0 0 0 0 0.1 0.2 0.3 0.4 0.5 0.6 0.7 0.8 0.9 1 1 1 1 1 1
  line L2 (4.3412, -24.6202) -> (0, -25)
  line L3 (0, -25) -> (-4.3412, -24.6202)
  point P0 (1, -27)
  point P1 (1, -35)
  point P2 (-3, -30)
extrude "Extrude3" add sketch "Sketch3" against normal blind 20 separate body contours A0 S1 S2 L3 makes body 2
